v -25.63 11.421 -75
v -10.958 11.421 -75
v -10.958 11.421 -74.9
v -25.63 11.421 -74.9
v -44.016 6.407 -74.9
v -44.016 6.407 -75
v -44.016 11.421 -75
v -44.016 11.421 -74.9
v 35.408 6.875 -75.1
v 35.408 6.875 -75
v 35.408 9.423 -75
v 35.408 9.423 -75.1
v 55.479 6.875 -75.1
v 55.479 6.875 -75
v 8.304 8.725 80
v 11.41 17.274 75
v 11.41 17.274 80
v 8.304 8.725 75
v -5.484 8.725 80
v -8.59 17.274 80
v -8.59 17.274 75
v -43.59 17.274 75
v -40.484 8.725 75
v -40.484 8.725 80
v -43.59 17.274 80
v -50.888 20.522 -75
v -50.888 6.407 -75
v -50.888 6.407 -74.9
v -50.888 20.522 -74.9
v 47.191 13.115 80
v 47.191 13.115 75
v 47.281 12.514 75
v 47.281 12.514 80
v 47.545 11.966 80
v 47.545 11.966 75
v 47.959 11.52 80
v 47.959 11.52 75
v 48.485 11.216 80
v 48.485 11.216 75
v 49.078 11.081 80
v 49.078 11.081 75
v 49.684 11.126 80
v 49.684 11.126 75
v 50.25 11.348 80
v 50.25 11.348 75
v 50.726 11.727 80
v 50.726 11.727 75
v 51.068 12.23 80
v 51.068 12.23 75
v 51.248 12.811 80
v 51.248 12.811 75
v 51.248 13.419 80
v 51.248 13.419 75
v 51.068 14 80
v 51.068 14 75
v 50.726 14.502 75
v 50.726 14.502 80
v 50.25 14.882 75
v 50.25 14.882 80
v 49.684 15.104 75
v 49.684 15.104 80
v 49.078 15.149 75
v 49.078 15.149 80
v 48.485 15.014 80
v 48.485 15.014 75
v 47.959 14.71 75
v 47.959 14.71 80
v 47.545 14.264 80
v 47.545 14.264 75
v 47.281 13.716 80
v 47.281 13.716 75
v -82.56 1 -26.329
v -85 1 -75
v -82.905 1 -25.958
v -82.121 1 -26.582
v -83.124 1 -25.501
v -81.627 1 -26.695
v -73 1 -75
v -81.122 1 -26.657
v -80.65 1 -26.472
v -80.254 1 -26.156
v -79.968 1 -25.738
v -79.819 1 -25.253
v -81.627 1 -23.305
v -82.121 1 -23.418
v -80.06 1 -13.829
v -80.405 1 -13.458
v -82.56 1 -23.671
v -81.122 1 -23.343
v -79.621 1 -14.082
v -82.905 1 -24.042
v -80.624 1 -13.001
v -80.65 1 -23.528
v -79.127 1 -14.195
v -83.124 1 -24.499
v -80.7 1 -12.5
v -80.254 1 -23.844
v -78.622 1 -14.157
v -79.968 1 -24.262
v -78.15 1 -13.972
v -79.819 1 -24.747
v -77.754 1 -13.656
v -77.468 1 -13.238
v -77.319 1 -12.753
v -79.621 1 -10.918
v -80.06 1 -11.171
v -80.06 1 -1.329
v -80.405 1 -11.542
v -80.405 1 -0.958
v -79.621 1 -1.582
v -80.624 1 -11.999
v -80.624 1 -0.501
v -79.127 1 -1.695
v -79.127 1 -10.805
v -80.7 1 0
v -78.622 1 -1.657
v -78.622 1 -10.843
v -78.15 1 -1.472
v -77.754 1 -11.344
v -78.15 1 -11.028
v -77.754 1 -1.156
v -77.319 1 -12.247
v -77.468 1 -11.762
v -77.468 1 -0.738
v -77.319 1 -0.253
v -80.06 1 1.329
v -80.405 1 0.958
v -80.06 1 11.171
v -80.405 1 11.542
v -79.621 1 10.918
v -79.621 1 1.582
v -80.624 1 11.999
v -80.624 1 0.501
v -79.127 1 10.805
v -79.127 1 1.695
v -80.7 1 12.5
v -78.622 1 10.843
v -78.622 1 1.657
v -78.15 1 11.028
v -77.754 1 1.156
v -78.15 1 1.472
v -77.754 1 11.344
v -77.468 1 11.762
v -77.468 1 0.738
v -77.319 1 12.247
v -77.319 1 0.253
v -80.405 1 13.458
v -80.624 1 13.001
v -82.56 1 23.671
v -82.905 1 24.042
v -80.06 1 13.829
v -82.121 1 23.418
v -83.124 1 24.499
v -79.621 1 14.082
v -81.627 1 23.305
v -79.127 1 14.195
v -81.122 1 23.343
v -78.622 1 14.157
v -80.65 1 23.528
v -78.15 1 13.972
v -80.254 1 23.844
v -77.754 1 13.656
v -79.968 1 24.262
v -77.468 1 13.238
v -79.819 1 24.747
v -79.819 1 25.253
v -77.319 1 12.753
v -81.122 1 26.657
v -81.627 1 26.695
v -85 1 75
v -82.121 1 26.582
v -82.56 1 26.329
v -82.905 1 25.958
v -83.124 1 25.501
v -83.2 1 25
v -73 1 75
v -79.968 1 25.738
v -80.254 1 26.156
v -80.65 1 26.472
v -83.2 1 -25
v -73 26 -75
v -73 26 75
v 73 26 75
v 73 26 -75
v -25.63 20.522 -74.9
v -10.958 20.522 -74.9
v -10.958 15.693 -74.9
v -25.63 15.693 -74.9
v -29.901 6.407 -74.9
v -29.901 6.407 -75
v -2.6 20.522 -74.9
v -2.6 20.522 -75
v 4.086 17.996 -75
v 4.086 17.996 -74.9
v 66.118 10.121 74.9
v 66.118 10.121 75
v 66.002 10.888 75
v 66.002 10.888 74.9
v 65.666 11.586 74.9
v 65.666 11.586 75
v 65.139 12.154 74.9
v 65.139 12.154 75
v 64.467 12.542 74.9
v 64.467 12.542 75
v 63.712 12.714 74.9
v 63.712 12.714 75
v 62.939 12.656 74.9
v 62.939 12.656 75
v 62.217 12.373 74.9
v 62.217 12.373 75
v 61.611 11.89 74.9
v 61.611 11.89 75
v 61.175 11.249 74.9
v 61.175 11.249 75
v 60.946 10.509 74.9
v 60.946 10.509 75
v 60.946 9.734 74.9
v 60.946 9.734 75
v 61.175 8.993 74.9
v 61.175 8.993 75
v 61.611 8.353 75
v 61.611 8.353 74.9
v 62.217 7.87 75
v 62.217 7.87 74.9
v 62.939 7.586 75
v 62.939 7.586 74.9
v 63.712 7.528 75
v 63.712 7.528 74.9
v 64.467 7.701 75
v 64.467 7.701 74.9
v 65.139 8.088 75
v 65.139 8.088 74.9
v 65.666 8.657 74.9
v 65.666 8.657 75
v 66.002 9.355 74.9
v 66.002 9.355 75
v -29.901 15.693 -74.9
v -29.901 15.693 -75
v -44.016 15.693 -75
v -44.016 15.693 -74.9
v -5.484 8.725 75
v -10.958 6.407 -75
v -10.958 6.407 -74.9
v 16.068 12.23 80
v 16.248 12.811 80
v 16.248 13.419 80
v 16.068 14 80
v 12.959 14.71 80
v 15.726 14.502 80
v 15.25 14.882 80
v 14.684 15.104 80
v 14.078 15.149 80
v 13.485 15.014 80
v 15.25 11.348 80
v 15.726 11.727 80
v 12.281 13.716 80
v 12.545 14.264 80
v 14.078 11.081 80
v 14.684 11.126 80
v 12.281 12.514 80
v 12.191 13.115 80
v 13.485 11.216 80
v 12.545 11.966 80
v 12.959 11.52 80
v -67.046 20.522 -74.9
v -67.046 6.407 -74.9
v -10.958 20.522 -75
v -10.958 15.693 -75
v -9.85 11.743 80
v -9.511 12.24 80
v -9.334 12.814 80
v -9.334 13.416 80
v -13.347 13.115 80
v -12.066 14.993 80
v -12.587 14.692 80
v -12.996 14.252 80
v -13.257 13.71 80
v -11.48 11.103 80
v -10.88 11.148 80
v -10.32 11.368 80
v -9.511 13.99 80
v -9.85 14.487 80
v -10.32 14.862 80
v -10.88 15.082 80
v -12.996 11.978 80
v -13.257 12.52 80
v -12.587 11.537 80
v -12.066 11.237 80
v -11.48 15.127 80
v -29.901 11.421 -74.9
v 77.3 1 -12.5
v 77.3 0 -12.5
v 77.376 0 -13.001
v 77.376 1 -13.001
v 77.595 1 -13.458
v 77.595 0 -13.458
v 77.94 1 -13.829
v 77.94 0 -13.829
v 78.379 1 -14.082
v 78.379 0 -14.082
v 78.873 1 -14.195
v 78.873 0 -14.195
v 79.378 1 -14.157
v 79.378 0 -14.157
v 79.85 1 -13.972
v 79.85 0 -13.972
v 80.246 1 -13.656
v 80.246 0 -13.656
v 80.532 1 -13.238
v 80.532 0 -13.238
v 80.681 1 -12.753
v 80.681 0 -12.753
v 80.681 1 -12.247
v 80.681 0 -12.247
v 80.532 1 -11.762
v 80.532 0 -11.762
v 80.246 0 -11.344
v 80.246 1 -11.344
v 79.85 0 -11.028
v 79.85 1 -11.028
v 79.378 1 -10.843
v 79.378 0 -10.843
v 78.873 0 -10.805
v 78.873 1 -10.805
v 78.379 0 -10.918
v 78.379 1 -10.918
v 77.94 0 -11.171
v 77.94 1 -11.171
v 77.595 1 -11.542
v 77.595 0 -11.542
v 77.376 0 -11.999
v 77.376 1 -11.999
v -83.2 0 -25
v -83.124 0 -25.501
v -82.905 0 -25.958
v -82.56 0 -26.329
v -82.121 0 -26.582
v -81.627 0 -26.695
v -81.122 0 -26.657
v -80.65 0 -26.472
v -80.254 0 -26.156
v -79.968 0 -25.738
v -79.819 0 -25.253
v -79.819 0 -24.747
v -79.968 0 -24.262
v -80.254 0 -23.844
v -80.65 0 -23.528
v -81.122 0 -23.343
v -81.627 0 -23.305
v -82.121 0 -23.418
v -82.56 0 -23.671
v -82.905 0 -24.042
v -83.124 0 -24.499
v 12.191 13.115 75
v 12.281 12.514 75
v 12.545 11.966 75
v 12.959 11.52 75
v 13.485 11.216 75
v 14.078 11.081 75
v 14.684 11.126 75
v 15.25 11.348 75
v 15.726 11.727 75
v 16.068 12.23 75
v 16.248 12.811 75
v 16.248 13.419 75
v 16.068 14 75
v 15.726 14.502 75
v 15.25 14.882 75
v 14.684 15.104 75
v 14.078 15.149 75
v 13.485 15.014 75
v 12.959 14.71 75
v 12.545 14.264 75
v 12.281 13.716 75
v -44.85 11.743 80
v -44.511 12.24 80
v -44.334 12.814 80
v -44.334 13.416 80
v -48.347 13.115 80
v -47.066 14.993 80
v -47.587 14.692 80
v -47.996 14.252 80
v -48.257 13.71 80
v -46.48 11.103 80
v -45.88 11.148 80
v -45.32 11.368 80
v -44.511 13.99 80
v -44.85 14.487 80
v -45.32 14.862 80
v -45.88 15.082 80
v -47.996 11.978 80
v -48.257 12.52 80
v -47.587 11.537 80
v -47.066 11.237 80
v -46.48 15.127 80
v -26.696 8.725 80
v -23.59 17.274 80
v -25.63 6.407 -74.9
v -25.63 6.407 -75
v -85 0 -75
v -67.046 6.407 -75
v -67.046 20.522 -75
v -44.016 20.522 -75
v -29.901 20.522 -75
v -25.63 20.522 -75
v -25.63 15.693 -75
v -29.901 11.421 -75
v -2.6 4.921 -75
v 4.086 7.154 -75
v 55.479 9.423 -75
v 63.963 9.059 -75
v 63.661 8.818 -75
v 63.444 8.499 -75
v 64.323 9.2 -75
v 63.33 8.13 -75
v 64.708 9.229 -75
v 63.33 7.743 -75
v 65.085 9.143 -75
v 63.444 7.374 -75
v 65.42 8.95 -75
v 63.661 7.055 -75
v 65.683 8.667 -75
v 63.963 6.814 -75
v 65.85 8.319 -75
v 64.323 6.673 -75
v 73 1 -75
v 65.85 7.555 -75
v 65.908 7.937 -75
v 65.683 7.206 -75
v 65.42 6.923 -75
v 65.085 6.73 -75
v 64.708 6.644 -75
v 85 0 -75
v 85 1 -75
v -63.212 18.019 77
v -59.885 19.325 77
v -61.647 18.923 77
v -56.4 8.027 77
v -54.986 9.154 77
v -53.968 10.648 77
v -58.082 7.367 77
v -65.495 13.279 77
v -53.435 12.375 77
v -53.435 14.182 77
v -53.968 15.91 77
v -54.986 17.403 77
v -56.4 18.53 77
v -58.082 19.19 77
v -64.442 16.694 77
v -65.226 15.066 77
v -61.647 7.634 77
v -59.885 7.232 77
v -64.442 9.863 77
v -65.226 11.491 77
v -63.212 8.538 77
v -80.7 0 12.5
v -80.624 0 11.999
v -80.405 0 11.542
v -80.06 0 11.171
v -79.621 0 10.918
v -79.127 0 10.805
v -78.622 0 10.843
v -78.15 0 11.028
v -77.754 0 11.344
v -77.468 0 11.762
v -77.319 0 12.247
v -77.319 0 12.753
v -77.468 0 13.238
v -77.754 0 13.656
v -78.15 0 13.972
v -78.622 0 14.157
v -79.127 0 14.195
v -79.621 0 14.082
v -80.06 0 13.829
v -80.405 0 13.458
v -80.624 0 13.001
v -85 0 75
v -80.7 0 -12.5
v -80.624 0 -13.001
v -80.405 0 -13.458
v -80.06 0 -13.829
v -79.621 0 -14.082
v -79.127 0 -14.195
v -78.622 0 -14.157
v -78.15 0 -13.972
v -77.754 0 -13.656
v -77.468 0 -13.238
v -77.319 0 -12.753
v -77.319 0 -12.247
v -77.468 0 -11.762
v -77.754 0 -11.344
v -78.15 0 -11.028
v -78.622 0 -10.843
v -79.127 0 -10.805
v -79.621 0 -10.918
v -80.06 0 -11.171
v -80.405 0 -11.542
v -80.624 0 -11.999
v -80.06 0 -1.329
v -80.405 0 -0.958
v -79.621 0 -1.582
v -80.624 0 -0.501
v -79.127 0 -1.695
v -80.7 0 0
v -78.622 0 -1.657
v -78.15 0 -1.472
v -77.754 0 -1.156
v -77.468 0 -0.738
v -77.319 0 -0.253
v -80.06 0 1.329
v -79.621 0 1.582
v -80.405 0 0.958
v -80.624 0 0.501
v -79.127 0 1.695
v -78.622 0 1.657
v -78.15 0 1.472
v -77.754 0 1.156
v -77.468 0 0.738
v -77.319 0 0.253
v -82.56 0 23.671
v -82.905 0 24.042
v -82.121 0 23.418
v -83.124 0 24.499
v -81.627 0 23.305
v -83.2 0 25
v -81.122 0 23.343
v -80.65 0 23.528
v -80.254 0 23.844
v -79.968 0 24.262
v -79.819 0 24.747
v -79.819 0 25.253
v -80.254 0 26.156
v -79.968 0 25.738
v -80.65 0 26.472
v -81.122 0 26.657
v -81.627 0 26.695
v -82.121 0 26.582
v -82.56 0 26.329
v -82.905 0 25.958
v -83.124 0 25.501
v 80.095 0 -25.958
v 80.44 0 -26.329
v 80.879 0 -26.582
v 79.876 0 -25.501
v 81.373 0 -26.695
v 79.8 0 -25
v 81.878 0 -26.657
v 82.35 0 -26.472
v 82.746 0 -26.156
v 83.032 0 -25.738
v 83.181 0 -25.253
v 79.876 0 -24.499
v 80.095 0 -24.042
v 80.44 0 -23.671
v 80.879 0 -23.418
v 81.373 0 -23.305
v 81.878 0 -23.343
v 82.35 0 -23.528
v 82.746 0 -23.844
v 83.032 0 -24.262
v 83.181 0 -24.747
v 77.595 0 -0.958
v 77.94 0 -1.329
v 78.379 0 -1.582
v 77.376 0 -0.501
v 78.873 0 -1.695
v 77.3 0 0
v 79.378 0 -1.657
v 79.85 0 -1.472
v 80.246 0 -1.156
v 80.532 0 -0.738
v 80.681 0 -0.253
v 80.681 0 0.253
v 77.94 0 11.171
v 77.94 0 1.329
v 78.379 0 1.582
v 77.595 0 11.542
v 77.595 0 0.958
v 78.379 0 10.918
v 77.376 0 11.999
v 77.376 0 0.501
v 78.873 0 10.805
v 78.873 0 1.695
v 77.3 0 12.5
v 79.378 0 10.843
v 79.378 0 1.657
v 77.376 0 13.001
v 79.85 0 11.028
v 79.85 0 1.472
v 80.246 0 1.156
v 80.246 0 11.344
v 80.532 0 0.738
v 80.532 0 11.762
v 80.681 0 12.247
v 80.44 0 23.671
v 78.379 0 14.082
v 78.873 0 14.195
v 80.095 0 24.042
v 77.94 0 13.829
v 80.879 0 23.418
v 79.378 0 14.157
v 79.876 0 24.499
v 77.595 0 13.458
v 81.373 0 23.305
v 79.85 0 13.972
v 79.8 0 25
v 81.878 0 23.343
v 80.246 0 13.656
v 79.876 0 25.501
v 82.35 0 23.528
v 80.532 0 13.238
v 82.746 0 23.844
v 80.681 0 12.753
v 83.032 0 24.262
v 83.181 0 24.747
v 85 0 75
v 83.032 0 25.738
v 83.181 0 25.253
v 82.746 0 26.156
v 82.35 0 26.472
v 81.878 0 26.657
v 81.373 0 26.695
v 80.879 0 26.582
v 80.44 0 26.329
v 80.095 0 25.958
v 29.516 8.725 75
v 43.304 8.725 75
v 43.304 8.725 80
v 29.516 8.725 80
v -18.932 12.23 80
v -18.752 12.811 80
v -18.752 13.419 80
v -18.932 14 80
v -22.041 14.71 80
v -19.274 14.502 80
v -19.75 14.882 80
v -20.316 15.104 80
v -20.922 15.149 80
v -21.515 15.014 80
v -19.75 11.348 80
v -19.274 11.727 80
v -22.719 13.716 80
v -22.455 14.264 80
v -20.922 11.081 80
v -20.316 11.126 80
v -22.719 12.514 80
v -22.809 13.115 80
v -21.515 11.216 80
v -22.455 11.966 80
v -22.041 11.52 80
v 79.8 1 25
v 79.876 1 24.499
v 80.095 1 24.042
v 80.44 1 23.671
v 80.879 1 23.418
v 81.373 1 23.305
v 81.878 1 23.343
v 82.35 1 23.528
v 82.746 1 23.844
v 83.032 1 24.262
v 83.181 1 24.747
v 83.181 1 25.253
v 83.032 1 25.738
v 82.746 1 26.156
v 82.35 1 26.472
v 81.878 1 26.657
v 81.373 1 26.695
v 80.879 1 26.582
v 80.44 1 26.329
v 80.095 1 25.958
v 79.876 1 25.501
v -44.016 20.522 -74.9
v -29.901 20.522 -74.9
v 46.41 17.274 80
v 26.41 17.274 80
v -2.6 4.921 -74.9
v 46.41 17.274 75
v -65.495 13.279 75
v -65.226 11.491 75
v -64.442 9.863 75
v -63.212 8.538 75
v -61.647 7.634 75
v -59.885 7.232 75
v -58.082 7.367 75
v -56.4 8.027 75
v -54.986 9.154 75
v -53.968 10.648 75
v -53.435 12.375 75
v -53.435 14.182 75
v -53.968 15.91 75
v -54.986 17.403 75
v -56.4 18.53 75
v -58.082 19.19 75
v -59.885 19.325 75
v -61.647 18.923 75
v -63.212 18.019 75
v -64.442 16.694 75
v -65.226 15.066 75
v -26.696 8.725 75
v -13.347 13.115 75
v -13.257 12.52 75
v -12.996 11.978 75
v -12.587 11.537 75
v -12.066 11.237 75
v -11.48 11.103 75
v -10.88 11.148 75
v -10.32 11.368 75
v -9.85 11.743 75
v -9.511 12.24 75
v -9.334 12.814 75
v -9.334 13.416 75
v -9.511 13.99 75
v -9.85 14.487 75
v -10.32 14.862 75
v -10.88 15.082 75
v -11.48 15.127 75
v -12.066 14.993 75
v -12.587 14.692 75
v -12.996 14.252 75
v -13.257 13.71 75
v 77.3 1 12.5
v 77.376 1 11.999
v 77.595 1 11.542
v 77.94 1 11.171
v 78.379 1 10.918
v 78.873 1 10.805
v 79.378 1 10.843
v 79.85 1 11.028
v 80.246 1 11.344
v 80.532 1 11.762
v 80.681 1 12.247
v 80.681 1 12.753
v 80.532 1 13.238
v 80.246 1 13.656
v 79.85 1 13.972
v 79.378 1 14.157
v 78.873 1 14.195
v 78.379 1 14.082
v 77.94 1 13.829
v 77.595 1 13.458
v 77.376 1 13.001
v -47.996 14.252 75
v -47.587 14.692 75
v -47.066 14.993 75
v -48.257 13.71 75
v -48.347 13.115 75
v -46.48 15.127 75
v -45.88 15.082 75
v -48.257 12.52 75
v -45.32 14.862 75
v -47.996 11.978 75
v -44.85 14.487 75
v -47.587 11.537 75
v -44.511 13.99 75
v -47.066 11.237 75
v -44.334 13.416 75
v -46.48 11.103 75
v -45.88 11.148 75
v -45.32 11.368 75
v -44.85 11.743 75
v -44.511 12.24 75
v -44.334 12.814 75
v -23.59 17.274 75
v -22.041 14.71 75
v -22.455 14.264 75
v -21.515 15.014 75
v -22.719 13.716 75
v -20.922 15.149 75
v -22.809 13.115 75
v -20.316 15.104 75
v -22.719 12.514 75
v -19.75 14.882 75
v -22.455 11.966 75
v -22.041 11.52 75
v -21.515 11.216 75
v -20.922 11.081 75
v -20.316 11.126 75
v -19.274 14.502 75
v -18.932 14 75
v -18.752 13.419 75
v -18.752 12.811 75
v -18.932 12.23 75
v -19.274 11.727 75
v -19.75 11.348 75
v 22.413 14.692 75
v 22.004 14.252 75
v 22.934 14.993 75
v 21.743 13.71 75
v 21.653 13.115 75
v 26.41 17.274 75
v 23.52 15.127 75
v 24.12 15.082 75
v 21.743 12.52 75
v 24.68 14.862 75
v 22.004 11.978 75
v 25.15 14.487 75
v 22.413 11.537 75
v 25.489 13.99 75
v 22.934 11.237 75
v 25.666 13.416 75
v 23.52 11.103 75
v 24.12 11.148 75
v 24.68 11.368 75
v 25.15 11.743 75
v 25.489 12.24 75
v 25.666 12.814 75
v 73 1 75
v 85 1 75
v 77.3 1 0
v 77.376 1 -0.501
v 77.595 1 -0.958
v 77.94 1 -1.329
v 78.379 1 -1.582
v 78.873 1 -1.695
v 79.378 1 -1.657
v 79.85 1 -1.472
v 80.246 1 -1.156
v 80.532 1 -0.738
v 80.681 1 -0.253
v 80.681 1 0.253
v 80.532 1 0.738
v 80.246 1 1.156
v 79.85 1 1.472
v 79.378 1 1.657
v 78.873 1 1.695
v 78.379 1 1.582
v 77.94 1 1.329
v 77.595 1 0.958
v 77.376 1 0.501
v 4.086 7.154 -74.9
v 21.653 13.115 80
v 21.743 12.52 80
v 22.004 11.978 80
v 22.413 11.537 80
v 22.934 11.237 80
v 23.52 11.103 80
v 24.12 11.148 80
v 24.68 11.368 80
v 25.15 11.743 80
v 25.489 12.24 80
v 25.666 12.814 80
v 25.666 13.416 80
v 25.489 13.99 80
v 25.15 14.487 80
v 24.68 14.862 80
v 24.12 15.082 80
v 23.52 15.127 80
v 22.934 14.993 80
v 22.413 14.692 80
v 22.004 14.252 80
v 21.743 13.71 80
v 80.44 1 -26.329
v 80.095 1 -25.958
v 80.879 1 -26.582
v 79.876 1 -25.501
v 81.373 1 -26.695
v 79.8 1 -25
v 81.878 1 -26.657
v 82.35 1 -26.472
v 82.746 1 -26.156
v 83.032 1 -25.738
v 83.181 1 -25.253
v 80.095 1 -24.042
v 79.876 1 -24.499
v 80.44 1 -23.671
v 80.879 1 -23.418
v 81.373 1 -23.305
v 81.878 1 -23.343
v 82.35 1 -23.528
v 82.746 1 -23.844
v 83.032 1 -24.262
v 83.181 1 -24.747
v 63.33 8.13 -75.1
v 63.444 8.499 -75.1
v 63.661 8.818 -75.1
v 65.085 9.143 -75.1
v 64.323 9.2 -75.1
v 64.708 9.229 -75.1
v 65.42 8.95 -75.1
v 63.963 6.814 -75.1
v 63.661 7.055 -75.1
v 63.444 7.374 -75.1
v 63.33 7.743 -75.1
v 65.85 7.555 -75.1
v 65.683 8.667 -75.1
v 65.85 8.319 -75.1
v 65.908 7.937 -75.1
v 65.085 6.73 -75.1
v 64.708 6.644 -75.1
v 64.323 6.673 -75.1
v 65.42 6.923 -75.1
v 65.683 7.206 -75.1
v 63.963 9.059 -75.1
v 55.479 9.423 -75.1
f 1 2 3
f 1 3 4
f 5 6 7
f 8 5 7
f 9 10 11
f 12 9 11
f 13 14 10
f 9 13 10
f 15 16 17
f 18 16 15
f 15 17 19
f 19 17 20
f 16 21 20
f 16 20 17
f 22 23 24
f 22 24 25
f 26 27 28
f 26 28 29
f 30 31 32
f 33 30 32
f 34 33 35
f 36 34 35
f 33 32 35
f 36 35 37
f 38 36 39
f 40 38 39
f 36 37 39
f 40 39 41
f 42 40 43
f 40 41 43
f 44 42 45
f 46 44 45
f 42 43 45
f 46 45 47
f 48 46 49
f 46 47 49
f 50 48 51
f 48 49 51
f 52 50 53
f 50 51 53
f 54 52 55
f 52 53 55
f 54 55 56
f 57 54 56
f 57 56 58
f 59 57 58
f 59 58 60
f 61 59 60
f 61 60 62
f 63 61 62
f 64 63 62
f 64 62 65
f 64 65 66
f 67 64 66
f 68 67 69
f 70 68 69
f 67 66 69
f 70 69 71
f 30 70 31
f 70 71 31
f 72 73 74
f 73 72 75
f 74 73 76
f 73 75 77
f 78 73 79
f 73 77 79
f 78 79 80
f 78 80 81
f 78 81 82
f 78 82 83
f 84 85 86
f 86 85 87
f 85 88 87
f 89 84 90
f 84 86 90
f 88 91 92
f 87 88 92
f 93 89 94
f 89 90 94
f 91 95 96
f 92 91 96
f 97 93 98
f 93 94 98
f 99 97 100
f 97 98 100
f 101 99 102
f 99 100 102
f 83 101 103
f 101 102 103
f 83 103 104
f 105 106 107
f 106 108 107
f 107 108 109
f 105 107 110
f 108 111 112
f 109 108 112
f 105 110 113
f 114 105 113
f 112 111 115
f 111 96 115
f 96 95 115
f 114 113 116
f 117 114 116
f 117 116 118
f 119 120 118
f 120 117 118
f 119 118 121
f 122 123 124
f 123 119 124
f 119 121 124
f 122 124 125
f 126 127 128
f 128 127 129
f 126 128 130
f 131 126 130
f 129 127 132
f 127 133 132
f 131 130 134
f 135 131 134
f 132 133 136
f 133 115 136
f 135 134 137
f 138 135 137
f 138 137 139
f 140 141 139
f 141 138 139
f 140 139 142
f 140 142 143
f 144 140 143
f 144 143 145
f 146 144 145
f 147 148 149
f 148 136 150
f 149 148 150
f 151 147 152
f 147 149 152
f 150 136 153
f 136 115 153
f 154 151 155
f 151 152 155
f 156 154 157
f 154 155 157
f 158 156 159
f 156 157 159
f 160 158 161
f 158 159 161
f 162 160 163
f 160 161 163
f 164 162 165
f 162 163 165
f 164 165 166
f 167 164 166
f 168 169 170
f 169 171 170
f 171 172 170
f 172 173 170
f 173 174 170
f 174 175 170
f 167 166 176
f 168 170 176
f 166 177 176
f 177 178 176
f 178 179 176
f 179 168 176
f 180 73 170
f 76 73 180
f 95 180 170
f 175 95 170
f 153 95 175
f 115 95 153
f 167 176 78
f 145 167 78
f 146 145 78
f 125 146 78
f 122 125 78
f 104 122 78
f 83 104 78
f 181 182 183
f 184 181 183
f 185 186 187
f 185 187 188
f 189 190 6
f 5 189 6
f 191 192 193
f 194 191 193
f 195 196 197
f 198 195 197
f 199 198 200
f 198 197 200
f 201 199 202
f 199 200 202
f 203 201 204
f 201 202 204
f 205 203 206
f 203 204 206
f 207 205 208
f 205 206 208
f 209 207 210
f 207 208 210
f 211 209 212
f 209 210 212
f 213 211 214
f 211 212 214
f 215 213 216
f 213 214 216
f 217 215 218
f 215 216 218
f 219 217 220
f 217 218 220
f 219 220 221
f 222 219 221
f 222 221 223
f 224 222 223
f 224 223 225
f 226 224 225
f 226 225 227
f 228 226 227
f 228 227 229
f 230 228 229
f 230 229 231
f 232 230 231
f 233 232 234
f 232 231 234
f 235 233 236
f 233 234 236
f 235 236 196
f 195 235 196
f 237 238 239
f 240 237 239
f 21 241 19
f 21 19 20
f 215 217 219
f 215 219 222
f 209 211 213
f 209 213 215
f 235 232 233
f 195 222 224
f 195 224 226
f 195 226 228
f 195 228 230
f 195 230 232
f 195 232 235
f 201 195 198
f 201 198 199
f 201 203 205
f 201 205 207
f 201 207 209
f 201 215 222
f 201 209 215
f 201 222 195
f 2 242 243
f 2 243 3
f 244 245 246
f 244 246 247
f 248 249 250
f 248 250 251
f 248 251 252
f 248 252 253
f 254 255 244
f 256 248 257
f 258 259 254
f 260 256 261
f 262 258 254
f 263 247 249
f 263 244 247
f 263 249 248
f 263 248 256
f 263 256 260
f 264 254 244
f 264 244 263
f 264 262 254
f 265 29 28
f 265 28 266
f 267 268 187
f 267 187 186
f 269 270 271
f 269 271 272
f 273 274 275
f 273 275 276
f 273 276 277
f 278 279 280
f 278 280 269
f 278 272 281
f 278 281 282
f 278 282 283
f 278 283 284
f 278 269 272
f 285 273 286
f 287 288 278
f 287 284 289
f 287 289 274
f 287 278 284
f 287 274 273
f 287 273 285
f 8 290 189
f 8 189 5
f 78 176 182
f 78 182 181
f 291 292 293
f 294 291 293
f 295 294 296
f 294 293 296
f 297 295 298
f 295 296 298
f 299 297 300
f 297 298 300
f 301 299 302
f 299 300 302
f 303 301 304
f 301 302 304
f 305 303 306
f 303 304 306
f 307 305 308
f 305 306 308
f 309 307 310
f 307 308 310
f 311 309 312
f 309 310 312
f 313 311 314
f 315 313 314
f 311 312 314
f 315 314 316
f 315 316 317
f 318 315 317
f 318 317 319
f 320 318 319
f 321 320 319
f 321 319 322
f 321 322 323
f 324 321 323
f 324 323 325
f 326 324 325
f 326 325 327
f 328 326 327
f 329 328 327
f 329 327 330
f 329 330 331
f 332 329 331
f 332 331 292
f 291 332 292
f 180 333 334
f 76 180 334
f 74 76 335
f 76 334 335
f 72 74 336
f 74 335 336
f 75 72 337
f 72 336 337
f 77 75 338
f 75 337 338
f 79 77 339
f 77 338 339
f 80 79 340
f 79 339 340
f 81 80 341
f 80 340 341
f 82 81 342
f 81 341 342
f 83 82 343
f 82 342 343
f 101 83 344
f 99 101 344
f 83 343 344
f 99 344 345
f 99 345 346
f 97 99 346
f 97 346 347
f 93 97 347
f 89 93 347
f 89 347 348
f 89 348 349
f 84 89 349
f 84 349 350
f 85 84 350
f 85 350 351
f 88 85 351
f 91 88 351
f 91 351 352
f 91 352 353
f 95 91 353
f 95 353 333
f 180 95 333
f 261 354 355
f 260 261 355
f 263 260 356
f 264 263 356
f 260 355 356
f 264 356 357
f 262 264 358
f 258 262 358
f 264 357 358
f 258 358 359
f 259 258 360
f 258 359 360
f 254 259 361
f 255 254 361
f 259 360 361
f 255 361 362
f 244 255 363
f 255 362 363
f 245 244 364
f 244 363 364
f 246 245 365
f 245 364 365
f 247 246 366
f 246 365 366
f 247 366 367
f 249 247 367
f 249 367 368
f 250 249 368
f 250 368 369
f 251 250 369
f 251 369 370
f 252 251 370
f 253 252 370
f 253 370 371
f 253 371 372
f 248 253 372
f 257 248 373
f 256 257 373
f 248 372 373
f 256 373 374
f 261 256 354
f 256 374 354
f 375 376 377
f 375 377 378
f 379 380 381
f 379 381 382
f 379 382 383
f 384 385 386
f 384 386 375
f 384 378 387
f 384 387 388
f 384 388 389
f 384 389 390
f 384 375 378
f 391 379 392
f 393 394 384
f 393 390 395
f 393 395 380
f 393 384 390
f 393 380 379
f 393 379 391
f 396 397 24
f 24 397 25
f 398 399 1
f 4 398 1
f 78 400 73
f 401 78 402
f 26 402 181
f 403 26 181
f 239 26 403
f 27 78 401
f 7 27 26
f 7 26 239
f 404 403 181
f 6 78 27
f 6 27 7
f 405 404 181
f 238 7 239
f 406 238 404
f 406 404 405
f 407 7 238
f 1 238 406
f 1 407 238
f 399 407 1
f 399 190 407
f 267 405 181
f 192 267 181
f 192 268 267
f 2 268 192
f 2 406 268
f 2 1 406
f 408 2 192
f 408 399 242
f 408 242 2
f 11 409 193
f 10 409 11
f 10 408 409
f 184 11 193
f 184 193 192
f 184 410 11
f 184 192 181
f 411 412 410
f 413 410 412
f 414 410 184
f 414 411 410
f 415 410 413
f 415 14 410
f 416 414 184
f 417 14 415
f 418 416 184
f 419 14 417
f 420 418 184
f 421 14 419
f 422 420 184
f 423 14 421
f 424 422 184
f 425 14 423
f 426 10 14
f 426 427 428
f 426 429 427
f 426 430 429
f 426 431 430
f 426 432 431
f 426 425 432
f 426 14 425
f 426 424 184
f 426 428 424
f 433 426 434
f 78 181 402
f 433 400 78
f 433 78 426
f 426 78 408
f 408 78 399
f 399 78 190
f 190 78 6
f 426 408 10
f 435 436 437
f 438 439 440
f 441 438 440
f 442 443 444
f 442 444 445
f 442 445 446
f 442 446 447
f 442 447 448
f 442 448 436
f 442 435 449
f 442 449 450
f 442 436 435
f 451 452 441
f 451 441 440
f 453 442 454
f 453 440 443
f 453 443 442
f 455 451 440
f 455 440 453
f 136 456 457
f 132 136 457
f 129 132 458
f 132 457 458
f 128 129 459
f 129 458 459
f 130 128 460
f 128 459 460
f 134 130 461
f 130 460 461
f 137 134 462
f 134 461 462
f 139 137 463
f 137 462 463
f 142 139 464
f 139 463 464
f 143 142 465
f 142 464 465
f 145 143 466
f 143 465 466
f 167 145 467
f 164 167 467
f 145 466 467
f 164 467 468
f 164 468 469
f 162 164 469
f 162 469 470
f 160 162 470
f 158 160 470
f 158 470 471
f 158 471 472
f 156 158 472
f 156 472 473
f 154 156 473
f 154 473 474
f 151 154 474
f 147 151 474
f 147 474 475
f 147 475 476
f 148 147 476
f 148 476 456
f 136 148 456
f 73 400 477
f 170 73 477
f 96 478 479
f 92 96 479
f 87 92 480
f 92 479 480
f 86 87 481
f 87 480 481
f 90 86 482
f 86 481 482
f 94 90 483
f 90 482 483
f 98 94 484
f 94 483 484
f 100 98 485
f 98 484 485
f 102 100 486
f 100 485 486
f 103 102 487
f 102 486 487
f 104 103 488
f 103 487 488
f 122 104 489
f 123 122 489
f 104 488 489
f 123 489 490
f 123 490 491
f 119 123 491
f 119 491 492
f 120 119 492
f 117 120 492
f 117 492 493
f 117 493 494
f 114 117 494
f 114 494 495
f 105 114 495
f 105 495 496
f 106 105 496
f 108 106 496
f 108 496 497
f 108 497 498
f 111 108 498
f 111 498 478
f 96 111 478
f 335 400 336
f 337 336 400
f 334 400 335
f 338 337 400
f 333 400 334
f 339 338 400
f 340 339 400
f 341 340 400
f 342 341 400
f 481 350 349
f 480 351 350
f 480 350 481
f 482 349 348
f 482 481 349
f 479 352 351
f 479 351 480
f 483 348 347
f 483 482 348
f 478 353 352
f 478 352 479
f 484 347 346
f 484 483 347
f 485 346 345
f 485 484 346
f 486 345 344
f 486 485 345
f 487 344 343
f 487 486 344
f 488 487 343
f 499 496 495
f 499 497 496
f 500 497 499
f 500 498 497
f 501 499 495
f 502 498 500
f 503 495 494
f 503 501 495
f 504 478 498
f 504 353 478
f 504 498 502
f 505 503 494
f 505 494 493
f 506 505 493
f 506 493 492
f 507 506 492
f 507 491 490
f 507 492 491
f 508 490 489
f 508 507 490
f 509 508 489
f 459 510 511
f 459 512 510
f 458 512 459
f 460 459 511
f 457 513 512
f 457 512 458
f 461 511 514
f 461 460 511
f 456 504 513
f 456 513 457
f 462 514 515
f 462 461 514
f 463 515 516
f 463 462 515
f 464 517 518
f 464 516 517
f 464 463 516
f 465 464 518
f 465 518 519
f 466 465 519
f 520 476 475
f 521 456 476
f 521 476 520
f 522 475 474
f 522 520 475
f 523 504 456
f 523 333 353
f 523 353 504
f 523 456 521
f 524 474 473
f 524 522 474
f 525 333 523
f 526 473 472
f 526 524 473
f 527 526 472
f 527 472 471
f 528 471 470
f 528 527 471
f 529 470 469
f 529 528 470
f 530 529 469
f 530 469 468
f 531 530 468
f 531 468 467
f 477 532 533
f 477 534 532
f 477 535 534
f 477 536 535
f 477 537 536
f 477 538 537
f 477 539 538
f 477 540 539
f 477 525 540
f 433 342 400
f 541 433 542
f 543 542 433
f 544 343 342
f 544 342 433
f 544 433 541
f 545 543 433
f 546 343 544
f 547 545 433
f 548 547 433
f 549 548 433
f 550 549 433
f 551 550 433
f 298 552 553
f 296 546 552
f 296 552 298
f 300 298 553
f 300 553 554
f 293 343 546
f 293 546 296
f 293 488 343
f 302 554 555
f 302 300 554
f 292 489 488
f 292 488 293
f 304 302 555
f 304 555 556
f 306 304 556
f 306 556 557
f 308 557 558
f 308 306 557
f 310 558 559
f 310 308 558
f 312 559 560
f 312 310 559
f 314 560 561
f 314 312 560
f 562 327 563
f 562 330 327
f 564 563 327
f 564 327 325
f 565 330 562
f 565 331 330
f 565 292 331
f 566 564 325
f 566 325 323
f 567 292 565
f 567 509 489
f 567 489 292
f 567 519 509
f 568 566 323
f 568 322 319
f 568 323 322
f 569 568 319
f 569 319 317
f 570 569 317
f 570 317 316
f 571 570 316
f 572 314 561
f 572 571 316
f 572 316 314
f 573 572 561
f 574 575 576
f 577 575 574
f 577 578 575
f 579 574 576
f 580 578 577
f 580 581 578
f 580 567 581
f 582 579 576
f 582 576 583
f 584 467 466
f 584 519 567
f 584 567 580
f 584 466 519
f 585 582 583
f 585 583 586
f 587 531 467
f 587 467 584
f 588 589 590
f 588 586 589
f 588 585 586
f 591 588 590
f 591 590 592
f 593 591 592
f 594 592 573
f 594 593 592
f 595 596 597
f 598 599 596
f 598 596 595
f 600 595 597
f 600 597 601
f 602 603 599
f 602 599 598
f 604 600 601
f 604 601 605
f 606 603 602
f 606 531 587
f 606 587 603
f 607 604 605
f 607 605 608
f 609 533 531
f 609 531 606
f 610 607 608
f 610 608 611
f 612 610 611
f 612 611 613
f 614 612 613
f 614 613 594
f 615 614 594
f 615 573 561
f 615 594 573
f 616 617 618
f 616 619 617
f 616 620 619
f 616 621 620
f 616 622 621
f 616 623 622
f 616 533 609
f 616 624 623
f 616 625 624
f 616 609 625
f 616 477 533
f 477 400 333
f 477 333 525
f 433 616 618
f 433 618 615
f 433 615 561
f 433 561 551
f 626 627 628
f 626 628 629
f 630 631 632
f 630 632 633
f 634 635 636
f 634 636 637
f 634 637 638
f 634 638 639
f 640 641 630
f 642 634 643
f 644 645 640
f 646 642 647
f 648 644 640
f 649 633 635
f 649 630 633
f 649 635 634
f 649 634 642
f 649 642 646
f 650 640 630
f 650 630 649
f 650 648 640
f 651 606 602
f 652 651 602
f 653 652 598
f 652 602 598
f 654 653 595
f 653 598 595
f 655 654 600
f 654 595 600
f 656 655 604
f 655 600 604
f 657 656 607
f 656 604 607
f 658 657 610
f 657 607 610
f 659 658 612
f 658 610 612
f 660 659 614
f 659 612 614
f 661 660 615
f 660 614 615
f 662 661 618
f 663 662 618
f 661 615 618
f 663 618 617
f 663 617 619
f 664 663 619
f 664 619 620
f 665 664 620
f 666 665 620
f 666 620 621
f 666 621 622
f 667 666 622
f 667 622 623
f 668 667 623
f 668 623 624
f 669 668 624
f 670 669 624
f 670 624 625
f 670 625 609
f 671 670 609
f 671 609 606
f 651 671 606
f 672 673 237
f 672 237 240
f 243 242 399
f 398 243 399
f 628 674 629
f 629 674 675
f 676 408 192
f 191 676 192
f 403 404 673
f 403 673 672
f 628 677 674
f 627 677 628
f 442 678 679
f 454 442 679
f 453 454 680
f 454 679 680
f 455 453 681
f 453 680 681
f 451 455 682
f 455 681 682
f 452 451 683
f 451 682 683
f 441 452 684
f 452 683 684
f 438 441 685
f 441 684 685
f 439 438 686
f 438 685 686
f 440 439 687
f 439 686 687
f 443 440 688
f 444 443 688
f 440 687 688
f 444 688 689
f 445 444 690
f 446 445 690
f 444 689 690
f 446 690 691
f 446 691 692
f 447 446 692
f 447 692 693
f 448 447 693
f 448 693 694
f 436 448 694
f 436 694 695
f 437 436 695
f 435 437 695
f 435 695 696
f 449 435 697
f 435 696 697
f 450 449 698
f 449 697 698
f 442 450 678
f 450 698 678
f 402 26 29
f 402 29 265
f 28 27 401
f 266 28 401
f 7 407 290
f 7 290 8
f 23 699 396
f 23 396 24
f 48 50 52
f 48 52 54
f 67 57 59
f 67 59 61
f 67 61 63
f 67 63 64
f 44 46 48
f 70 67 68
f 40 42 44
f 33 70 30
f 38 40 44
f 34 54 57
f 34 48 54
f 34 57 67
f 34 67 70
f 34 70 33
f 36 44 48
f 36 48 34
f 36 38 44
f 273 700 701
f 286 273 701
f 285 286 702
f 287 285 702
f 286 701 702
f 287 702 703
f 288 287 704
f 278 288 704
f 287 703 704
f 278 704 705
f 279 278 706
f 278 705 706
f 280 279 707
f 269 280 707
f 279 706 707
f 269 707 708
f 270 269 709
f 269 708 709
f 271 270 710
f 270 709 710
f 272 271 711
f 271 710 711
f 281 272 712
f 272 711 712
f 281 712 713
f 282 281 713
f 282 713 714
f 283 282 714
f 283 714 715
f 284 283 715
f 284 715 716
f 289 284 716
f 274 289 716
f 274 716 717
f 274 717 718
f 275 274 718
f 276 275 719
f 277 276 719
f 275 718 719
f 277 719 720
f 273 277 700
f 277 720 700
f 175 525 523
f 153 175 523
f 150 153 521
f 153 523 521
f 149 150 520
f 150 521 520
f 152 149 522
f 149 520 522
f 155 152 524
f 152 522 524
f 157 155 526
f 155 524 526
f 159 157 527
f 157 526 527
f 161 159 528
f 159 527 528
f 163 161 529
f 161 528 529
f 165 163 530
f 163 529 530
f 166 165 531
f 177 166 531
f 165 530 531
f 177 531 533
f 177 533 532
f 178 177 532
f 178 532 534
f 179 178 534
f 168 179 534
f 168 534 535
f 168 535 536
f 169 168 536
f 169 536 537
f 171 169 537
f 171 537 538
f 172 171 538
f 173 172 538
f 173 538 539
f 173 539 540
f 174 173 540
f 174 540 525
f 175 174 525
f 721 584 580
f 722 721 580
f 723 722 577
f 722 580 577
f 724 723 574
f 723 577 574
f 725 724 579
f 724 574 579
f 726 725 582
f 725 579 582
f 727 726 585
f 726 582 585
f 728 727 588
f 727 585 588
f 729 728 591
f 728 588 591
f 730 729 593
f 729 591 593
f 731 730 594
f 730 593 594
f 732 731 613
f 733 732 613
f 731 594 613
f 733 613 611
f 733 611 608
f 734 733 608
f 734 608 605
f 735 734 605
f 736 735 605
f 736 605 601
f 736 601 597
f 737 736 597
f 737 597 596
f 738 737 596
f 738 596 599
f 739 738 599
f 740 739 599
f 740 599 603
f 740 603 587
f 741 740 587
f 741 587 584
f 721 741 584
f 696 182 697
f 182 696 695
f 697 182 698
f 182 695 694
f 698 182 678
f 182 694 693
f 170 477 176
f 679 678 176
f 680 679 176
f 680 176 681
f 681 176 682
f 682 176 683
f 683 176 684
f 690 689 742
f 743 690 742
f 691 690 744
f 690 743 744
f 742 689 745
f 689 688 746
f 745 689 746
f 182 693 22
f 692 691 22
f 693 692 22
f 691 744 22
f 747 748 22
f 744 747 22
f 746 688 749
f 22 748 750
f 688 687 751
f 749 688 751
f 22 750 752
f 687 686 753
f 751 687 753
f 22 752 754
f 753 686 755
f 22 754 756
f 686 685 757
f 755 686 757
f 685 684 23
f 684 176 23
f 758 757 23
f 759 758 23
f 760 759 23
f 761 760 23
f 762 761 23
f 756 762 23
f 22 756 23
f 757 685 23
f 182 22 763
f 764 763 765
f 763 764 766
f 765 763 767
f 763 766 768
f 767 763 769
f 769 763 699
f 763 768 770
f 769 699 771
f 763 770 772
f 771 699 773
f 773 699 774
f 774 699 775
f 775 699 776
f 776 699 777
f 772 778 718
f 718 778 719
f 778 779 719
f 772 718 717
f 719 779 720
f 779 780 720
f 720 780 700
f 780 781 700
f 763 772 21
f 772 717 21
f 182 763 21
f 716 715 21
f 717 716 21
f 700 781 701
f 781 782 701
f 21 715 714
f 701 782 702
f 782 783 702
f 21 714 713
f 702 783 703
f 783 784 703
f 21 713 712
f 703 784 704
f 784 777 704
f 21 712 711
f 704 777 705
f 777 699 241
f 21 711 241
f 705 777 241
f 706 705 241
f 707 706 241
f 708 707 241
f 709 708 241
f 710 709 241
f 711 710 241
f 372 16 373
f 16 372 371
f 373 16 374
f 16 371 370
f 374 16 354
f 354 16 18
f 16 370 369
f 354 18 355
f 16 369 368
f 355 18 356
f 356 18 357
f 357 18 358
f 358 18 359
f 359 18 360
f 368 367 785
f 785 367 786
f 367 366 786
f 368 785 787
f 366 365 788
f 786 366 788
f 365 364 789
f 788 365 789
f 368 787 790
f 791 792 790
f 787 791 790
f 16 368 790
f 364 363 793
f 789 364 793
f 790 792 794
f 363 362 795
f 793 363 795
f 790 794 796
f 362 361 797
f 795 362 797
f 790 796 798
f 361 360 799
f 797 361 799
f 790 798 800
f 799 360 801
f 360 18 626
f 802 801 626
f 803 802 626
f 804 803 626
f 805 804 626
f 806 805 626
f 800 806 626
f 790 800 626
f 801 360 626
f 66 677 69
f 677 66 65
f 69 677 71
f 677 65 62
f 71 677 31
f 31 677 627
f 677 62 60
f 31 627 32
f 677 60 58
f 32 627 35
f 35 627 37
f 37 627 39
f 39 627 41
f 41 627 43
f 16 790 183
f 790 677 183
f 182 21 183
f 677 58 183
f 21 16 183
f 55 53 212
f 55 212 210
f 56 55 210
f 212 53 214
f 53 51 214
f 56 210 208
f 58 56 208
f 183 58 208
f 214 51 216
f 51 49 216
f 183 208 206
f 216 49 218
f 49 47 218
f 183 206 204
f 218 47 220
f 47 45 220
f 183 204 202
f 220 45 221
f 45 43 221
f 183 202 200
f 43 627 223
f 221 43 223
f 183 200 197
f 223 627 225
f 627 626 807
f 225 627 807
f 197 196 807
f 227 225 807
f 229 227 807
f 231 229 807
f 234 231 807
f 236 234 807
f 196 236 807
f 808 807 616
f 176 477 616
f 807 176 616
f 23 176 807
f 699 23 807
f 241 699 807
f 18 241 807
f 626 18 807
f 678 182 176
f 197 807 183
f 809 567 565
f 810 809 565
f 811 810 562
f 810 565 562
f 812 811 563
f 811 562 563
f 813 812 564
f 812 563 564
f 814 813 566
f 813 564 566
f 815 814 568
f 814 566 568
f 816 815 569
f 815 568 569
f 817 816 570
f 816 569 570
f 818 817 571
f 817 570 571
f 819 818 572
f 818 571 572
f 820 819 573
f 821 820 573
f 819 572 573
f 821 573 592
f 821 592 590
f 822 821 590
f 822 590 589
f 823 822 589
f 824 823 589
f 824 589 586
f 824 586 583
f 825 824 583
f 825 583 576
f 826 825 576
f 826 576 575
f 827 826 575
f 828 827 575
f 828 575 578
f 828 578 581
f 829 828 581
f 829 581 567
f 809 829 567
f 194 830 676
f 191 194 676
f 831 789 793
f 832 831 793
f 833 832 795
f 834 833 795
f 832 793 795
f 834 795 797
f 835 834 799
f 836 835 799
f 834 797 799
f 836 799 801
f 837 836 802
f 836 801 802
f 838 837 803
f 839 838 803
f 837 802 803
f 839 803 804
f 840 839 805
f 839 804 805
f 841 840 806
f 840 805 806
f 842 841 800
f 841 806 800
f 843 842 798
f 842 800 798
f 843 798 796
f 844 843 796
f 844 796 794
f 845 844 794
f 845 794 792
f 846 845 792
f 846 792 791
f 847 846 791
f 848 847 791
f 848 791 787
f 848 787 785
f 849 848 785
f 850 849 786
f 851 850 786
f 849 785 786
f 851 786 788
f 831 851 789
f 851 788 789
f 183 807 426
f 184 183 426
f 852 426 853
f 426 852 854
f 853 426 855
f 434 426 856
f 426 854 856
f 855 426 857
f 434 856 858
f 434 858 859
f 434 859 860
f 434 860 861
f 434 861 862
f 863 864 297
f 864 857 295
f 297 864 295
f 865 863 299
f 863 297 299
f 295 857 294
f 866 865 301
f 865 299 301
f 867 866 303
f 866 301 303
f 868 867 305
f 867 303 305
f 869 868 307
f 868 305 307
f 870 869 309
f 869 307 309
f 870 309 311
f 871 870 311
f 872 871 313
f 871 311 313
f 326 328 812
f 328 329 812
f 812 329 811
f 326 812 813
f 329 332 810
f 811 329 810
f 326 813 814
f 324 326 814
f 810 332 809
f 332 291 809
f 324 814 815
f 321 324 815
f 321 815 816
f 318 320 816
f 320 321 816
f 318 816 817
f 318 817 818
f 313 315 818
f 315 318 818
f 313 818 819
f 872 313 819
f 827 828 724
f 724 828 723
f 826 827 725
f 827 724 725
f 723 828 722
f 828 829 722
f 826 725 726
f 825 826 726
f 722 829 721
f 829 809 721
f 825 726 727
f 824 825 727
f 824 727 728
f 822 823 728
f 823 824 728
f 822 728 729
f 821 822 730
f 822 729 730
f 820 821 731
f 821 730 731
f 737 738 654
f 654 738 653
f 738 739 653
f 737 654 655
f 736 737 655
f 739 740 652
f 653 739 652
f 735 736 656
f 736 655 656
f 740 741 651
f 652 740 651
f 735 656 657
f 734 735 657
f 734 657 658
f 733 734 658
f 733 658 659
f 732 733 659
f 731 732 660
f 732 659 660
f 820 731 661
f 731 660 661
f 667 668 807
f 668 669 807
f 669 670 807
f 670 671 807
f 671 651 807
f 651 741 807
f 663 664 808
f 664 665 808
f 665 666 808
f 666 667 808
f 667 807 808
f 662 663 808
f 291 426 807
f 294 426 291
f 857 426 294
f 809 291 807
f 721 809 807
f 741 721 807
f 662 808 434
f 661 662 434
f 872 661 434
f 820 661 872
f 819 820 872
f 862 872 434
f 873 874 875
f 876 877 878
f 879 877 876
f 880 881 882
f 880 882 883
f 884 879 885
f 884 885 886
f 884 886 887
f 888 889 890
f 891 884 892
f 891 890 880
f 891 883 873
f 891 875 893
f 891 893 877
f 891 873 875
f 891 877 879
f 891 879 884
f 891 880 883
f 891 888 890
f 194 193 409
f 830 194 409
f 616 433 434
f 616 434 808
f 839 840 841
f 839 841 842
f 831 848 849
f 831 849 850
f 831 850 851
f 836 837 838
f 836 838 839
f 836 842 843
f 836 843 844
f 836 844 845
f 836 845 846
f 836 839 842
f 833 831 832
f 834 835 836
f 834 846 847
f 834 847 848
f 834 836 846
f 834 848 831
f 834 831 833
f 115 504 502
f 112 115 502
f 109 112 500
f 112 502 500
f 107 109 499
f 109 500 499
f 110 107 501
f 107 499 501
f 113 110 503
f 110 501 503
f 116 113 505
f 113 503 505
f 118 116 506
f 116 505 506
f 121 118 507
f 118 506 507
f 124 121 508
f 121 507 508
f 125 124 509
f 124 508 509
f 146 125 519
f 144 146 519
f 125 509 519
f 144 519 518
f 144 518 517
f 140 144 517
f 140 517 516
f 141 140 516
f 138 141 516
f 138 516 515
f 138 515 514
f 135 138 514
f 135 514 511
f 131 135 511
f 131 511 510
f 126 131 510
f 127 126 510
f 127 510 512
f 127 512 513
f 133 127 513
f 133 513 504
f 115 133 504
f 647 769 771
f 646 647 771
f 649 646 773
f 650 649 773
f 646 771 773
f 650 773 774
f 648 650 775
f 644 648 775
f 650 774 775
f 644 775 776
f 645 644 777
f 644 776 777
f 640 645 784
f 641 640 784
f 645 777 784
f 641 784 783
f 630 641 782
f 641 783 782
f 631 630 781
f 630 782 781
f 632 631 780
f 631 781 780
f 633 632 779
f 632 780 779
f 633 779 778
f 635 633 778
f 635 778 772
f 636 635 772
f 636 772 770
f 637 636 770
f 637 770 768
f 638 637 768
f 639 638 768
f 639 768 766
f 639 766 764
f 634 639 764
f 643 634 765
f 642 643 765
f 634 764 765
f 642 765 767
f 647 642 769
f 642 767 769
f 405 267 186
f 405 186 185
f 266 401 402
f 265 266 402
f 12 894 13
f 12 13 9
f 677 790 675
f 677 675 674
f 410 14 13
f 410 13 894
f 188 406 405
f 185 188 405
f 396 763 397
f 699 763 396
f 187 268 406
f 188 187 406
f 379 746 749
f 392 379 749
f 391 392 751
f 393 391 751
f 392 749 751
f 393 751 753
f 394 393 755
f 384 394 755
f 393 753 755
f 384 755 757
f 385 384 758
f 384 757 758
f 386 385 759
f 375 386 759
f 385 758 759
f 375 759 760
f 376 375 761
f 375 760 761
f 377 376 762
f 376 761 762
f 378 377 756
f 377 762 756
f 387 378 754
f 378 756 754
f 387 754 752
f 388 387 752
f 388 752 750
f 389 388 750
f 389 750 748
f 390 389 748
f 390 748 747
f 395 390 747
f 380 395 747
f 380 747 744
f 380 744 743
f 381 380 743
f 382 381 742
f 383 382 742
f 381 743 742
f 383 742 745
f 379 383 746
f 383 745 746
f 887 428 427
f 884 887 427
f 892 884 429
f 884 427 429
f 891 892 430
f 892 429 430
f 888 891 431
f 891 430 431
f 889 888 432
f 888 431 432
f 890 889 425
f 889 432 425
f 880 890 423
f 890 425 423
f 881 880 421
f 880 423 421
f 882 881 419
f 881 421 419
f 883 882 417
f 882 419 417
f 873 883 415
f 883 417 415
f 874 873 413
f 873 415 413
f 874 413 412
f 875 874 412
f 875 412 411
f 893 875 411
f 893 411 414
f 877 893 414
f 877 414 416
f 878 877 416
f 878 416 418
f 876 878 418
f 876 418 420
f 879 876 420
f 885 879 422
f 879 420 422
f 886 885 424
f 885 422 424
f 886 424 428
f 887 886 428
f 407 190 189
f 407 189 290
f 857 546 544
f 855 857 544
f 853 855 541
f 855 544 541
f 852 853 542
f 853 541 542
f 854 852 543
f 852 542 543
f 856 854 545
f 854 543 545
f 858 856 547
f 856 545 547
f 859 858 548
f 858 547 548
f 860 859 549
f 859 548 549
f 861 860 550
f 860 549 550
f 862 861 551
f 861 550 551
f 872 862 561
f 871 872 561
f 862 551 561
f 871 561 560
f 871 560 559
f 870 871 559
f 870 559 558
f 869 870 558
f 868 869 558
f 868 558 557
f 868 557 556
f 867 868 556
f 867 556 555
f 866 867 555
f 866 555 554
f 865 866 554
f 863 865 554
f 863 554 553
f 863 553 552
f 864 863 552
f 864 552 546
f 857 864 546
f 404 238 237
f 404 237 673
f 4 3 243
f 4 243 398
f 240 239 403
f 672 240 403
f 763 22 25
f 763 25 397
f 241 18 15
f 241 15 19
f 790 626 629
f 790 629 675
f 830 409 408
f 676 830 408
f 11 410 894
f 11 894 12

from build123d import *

# Parameters (mm, degrees)
SKETCH_1_W             = 146
SKETCH_1_H             = 150
EXTRUDE_1_DEPTH        = 26
SKETCH_2_W             = 170
SKETCH_2_H             = 150
EXTRUDE_2_DEPTH        = 1
HOLE_WIZARD_M3_1_D     = 3.4
SKETCH_5_R             = 6.063811431
EXTRUDE_3_DEPTH        = 2
SKETCH_6_R             = 2.017692423
SKETCH_6_R_2           = 2.03992662
EXTRUDE_4_DEPTH        = 5
PATTERN_LINEAR_1_COUNT = 3
PATTERN_LINEAR_1_PITCH = 35
SKETCH_7_R             = 2.600130351
CUT_EXTRUDE_1_DEPTH    = 0.1
SKETCH_8_W             = 14.672164123
SKETCH_8_H             = 4.828813509
SKETCH_8_W_2           = 14.114993332
SKETCH_8_H_2           = 5.014537105
SKETCH_8_W_3           = 16.157952894
SKETCH_8_H_3           = 14.114993333
CUT_EXTRUDE_2_DEPTH    = 0.1
SKETCH_9_R             = 1.296267094
SKETCH_9_W             = 20.070729893
SKETCH_9_H             = 2.548664114
EXTRUDE_5_DEPTH        = 0.1


with BuildPart() as part:
    # 草图1 → 凸台-拉伸1 (new body)
    with BuildSketch(Plane(origin=(0, 0, 0), x_dir=(1, 0, 0), z_dir=(0, 1, 0))):
        Rectangle(SKETCH_1_W, SKETCH_1_H)
    extrude(amount=EXTRUDE_1_DEPTH)

    # 草图2 → 凸台-拉伸2 (add)
    with BuildSketch(Plane.XZ):
        Rectangle(SKETCH_2_W, SKETCH_2_H)
    extrude(amount=-EXTRUDE_2_DEPTH)

    # M3 间隙孔1 (through all)
    with Locations(Plane(origin=(0, 1, 0), x_dir=(1, 0, 0), z_dir=(0, 1, 0))):
        with Locations((-81.5, 25), (-81.5, -25), (81.5, 25), (81.5, -25), (-79, 12.5), (-79, 0), (-79, -12.5), (79, -12.5), (79, 0), (79, 12.5)):
            Hole(HOLE_WIZARD_M3_1_D / 2)

    # 草图5 → 凸台-拉伸3 (add)
    with BuildSketch(Plane.XY.offset(75)):
        with Locations(Location((-59.431550874, 13.278585395, 0), (0, 0, 180))):
            Circle(SKETCH_5_R)
    extrude(amount=EXTRUDE_3_DEPTH)

    # 草图6 → 凸台-拉伸4 (add)
    with BuildSketch(Plane.XY.offset(75)):
        with Locations(Location((-46.32884835, 13.11494848, 0), (0, 0, 180))):
            Circle(SKETCH_6_R)
        with Locations(Location((-20.769548413, 13.11494848, 0), (0, 0, 180))):
            Circle(SKETCH_6_R_2)
        Polygon((-43.590070032, 17.274031542), (-23.590070032, 17.274031542), (-26.696119877, 8.72468841), (-40.484020187, 8.72468841), align=None)
    extrude_4 = extrude(amount=EXTRUDE_4_DEPTH)

    # 阵列(线性)1: 凸台-拉伸4 ×3
    with Locations(*[(i * PATTERN_LINEAR_1_PITCH, 0, 0) for i in range(1, PATTERN_LINEAR_1_COUNT)]):
        add(extrude_4)

    # 草图7 → 切除-拉伸1 (cut)
    with BuildSketch(Plane.XY.offset(75)):
        with Locations((63.517469997, 10.121284255)):
            Circle(SKETCH_7_R)
    extrude(amount=-CUT_EXTRUDE_1_DEPTH, mode=Mode.SUBTRACT)

    # 草图8 → 切除-拉伸2 (cut)
    with BuildSketch(Plane(origin=(0, 0, -75), x_dir=(-1, 0, 0), z_dir=(0, 0, -1))):
        Polygon((2.600130351, 20.521805658), (-4.085919123, 17.995663664), (-4.085919123, 7.154283691), (2.600130351, 4.921023553), align=None)
        with Locations((18.293774254, 18.107398904)):
            Rectangle(SKETCH_8_W, SKETCH_8_H)
        with Locations((36.9589957, 18.107398904)):
            Rectangle(SKETCH_8_W_2, SKETCH_8_H)
        with Locations((18.293774254, 8.914080878)):
            Rectangle(SKETCH_8_W, SKETCH_8_H_2)
        with Locations((36.9589957, 8.914080878)):
            Rectangle(SKETCH_8_W_2, SKETCH_8_H_2)
        with Locations((58.967241883, 13.464308992)):
            Rectangle(SKETCH_8_W_3, SKETCH_8_H_3)
    extrude(amount=-CUT_EXTRUDE_2_DEPTH, mode=Mode.SUBTRACT)

    # 草图9 → 凸台-拉伸5 (add)
    with BuildSketch(Plane(origin=(0, 0, -75), x_dir=(-1, 0, 0), z_dir=(0, 0, -1))):
        with Locations(Location((-64.611587391, 7.936618922, 0), (0, 0, 180))):
            Circle(SKETCH_9_R)
        with Locations((-45.443509371, 8.149007598)):
            Rectangle(SKETCH_9_W, SKETCH_9_H)
    extrude(amount=EXTRUDE_5_DEPTH)


solid = part.part
